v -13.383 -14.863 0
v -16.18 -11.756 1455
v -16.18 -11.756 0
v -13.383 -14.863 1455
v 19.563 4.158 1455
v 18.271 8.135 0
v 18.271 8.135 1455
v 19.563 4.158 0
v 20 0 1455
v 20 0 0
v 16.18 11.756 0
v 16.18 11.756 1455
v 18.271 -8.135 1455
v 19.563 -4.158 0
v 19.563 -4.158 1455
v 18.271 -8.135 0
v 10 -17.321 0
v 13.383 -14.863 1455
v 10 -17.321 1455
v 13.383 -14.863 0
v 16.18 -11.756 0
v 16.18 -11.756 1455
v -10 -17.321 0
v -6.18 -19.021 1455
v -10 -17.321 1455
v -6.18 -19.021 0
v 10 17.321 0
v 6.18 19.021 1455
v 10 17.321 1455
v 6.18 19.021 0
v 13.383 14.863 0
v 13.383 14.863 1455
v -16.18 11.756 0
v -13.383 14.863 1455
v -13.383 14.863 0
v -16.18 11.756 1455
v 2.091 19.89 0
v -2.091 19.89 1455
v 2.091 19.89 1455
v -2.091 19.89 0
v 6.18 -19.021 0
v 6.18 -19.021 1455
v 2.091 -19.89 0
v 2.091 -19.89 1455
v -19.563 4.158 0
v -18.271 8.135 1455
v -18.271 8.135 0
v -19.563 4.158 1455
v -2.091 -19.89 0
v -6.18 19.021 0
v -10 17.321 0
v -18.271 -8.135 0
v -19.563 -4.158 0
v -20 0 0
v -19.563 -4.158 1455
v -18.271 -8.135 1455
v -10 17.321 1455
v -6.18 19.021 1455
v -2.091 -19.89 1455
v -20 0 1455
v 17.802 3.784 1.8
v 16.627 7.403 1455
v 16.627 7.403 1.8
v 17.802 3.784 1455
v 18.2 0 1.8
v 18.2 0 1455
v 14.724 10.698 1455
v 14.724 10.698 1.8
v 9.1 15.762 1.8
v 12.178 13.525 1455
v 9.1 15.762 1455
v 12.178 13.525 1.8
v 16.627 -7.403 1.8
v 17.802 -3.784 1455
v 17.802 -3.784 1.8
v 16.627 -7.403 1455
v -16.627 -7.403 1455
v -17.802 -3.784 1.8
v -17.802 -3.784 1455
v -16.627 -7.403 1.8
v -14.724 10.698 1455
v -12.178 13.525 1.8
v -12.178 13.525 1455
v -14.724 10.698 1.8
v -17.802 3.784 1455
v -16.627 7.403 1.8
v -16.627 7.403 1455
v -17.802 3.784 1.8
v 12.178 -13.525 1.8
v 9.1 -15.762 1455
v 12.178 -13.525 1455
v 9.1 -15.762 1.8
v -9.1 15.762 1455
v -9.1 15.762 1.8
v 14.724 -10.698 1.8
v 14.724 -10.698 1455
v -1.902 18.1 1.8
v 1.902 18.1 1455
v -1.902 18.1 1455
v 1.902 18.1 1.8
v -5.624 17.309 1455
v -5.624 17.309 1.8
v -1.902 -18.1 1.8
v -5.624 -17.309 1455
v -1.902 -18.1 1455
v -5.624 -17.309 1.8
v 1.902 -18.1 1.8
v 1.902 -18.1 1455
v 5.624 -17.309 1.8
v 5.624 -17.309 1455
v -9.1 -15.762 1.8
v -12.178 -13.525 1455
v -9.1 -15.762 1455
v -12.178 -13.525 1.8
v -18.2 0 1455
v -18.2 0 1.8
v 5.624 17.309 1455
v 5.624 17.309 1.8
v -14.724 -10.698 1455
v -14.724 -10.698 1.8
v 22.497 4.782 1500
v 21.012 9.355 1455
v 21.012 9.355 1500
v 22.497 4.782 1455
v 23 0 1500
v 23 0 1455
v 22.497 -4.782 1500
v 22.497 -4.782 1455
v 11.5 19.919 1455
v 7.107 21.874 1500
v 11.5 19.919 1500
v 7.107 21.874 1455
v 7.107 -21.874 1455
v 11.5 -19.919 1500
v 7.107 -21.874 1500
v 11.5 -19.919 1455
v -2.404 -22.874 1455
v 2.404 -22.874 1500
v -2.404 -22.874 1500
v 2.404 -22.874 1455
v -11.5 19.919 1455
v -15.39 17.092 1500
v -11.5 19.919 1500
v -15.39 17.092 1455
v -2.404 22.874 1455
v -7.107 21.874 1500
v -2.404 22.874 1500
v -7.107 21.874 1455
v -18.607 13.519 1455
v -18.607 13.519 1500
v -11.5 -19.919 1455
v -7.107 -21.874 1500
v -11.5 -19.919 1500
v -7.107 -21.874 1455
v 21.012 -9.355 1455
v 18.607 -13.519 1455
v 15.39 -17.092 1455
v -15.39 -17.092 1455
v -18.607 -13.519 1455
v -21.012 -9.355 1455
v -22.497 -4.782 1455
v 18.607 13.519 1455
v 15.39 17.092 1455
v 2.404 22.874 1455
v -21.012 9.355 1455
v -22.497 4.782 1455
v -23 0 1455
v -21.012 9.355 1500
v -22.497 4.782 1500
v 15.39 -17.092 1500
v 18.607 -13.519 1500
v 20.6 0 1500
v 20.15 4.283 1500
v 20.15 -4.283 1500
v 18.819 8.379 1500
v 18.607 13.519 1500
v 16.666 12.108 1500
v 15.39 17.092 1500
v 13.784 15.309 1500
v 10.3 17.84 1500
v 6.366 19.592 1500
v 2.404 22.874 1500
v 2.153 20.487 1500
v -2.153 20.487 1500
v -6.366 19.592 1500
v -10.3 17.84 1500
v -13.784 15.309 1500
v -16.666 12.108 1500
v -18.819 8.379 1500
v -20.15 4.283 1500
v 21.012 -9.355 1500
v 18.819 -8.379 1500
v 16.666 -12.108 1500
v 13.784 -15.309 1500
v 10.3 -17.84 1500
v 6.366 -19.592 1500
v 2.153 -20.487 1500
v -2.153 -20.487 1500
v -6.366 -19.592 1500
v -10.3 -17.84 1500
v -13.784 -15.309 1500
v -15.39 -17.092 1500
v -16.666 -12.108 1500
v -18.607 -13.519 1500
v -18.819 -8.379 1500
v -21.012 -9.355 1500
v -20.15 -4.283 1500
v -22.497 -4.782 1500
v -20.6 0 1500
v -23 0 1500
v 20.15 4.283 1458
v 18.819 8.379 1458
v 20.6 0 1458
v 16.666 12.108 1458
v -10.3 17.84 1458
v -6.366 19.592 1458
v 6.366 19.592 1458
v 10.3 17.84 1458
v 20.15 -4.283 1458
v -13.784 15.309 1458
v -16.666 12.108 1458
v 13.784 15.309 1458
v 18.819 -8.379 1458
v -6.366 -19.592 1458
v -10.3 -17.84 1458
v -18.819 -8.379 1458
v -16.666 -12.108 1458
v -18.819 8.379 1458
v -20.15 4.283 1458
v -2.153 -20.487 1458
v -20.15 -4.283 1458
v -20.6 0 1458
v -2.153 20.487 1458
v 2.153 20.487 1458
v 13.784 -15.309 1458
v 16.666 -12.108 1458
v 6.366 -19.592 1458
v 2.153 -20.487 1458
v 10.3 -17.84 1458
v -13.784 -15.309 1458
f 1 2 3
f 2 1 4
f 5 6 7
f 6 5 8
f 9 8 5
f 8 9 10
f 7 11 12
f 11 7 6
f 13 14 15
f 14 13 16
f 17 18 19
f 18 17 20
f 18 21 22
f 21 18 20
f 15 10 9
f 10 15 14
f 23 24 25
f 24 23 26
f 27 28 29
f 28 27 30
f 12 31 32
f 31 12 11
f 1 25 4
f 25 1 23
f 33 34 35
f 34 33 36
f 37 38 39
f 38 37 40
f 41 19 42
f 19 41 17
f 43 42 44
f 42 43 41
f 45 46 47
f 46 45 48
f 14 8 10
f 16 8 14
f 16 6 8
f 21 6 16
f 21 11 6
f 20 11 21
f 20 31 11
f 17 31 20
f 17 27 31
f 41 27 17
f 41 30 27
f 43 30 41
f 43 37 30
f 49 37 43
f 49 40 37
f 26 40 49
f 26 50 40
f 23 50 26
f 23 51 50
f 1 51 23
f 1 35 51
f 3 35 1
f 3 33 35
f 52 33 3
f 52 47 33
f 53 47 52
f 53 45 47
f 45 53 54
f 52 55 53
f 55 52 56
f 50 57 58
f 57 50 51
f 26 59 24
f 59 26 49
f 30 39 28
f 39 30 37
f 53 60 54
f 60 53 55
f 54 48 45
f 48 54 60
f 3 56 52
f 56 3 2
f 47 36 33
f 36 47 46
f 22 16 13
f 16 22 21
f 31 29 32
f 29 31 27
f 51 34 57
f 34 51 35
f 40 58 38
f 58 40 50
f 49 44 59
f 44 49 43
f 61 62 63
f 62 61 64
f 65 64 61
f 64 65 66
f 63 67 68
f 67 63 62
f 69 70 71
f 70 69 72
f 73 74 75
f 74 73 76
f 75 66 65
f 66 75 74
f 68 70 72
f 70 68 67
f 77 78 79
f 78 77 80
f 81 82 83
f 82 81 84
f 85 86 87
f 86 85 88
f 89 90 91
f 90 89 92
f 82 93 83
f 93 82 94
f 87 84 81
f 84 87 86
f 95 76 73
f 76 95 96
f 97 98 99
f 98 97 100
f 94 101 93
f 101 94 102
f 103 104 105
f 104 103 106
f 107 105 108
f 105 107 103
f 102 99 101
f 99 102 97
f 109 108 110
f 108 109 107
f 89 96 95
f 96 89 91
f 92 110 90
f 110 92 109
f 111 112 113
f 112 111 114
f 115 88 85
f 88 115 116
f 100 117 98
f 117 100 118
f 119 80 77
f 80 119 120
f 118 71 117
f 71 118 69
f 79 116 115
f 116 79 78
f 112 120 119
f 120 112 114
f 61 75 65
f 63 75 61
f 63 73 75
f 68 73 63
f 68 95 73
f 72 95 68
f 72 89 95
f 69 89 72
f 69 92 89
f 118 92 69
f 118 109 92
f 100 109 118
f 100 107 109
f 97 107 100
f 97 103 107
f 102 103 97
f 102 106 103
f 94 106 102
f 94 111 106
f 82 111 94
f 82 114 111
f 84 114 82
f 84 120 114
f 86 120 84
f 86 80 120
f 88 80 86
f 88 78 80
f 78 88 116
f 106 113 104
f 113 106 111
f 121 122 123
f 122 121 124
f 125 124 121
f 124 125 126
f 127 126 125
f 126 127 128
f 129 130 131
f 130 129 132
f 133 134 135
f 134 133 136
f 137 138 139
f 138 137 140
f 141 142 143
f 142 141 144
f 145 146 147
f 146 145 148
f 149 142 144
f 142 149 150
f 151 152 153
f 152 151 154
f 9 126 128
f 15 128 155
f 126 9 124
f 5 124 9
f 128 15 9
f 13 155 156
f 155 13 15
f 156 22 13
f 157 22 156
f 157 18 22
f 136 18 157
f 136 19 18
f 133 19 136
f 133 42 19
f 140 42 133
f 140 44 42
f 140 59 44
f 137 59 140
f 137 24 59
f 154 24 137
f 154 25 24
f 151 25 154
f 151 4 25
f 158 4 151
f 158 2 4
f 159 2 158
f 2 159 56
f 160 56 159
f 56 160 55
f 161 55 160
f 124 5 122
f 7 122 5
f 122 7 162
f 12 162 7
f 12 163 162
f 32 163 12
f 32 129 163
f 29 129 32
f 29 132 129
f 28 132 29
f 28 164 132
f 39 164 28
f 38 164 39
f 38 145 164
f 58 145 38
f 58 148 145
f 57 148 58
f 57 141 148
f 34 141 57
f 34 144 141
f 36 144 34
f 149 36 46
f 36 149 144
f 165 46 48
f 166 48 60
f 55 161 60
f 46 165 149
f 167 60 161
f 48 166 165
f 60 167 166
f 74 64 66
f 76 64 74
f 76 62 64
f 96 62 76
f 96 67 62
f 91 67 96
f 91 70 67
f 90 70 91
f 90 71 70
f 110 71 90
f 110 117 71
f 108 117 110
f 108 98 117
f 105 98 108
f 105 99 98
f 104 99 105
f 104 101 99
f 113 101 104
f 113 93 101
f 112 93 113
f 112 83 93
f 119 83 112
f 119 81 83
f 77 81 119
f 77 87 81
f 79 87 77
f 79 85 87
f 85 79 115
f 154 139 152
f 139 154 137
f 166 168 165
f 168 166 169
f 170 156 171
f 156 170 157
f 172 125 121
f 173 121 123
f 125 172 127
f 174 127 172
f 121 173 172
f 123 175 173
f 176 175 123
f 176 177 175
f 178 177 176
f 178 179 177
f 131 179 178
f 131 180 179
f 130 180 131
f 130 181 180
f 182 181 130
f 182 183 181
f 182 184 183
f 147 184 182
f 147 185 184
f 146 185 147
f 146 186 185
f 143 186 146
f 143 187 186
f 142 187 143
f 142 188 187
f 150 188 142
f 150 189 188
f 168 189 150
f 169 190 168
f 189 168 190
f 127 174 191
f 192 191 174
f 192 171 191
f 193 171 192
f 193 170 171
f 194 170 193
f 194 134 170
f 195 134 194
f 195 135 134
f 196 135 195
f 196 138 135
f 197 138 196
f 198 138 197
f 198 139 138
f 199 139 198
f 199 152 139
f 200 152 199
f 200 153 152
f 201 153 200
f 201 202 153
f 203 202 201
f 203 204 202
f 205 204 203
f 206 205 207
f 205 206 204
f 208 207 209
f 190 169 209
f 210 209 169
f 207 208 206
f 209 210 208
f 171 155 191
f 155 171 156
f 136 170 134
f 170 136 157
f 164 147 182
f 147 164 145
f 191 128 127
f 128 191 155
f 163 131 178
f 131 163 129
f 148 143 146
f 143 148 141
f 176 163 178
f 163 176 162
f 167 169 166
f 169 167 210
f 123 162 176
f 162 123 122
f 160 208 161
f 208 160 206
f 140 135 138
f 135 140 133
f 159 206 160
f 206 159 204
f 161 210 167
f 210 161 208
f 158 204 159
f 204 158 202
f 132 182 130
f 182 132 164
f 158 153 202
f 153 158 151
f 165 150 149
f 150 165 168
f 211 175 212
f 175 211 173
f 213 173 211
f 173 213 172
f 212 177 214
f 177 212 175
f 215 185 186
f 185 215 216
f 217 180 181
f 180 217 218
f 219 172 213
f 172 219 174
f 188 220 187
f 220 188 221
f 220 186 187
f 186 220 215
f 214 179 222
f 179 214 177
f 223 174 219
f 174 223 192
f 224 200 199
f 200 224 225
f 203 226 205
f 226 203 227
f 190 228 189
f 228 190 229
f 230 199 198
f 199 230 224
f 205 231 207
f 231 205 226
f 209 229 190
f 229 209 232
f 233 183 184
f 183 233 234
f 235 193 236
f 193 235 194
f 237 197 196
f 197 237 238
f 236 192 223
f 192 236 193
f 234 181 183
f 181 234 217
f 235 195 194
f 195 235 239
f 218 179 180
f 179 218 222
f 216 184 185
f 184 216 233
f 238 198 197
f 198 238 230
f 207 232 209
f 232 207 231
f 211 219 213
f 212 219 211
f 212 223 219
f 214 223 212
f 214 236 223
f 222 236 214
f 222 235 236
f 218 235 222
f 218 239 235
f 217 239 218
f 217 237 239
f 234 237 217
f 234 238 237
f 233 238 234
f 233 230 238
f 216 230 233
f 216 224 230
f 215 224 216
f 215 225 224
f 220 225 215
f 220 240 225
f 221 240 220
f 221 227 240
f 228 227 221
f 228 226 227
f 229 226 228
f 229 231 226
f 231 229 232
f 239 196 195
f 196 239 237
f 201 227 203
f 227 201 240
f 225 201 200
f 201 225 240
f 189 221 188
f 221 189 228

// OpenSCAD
// Parameters
nominal_diameter = 40; //[20:80:1]
length_mm = 1500; //[750:3000:10]
pipe_od = 40; //[20:80:1]
pipe_wall = 1.8; //[0.9:3.6:0.1]
fitting_length = 45; //[25:90:1]
fitting_wall = 3.0; //[1.5:6.0:0.1]
fitting_od_extra = 6; //[2:12:0.5]
socket_clearance = 0.6; //[0.2:1.2:0.1]
overlap = 1.0; //[0.5:2.0:0.1]

// HT Pipe - complete geometry
module ht_pipe() {
  color([0.85, 0.85, 0.8]) { // PVC color
    // Pipe body
    difference() {
      cylinder(h=length_mm - fitting_length + overlap, r=pipe_od/2, center=false);
      translate([0, 0, pipe_wall])
        cylinder(h=length_mm - fitting_length + overlap, r=pipe_od/2 - pipe_wall, center=false);
    }
    
    // End fitting
    difference() {
      translate([0, 0, length_mm - fitting_length])
        cylinder(h=fitting_length, r=pipe_od/2 + fitting_od_extra/2, center=false);
      translate([0, 0, length_mm - fitting_length + fitting_wall])
        cylinder(h=fitting_length, r=pipe_od/2 + socket_clearance, center=false);
    }
  }
}

// Assembly
module assembly() {
  ht_pipe();
}

assembly();
